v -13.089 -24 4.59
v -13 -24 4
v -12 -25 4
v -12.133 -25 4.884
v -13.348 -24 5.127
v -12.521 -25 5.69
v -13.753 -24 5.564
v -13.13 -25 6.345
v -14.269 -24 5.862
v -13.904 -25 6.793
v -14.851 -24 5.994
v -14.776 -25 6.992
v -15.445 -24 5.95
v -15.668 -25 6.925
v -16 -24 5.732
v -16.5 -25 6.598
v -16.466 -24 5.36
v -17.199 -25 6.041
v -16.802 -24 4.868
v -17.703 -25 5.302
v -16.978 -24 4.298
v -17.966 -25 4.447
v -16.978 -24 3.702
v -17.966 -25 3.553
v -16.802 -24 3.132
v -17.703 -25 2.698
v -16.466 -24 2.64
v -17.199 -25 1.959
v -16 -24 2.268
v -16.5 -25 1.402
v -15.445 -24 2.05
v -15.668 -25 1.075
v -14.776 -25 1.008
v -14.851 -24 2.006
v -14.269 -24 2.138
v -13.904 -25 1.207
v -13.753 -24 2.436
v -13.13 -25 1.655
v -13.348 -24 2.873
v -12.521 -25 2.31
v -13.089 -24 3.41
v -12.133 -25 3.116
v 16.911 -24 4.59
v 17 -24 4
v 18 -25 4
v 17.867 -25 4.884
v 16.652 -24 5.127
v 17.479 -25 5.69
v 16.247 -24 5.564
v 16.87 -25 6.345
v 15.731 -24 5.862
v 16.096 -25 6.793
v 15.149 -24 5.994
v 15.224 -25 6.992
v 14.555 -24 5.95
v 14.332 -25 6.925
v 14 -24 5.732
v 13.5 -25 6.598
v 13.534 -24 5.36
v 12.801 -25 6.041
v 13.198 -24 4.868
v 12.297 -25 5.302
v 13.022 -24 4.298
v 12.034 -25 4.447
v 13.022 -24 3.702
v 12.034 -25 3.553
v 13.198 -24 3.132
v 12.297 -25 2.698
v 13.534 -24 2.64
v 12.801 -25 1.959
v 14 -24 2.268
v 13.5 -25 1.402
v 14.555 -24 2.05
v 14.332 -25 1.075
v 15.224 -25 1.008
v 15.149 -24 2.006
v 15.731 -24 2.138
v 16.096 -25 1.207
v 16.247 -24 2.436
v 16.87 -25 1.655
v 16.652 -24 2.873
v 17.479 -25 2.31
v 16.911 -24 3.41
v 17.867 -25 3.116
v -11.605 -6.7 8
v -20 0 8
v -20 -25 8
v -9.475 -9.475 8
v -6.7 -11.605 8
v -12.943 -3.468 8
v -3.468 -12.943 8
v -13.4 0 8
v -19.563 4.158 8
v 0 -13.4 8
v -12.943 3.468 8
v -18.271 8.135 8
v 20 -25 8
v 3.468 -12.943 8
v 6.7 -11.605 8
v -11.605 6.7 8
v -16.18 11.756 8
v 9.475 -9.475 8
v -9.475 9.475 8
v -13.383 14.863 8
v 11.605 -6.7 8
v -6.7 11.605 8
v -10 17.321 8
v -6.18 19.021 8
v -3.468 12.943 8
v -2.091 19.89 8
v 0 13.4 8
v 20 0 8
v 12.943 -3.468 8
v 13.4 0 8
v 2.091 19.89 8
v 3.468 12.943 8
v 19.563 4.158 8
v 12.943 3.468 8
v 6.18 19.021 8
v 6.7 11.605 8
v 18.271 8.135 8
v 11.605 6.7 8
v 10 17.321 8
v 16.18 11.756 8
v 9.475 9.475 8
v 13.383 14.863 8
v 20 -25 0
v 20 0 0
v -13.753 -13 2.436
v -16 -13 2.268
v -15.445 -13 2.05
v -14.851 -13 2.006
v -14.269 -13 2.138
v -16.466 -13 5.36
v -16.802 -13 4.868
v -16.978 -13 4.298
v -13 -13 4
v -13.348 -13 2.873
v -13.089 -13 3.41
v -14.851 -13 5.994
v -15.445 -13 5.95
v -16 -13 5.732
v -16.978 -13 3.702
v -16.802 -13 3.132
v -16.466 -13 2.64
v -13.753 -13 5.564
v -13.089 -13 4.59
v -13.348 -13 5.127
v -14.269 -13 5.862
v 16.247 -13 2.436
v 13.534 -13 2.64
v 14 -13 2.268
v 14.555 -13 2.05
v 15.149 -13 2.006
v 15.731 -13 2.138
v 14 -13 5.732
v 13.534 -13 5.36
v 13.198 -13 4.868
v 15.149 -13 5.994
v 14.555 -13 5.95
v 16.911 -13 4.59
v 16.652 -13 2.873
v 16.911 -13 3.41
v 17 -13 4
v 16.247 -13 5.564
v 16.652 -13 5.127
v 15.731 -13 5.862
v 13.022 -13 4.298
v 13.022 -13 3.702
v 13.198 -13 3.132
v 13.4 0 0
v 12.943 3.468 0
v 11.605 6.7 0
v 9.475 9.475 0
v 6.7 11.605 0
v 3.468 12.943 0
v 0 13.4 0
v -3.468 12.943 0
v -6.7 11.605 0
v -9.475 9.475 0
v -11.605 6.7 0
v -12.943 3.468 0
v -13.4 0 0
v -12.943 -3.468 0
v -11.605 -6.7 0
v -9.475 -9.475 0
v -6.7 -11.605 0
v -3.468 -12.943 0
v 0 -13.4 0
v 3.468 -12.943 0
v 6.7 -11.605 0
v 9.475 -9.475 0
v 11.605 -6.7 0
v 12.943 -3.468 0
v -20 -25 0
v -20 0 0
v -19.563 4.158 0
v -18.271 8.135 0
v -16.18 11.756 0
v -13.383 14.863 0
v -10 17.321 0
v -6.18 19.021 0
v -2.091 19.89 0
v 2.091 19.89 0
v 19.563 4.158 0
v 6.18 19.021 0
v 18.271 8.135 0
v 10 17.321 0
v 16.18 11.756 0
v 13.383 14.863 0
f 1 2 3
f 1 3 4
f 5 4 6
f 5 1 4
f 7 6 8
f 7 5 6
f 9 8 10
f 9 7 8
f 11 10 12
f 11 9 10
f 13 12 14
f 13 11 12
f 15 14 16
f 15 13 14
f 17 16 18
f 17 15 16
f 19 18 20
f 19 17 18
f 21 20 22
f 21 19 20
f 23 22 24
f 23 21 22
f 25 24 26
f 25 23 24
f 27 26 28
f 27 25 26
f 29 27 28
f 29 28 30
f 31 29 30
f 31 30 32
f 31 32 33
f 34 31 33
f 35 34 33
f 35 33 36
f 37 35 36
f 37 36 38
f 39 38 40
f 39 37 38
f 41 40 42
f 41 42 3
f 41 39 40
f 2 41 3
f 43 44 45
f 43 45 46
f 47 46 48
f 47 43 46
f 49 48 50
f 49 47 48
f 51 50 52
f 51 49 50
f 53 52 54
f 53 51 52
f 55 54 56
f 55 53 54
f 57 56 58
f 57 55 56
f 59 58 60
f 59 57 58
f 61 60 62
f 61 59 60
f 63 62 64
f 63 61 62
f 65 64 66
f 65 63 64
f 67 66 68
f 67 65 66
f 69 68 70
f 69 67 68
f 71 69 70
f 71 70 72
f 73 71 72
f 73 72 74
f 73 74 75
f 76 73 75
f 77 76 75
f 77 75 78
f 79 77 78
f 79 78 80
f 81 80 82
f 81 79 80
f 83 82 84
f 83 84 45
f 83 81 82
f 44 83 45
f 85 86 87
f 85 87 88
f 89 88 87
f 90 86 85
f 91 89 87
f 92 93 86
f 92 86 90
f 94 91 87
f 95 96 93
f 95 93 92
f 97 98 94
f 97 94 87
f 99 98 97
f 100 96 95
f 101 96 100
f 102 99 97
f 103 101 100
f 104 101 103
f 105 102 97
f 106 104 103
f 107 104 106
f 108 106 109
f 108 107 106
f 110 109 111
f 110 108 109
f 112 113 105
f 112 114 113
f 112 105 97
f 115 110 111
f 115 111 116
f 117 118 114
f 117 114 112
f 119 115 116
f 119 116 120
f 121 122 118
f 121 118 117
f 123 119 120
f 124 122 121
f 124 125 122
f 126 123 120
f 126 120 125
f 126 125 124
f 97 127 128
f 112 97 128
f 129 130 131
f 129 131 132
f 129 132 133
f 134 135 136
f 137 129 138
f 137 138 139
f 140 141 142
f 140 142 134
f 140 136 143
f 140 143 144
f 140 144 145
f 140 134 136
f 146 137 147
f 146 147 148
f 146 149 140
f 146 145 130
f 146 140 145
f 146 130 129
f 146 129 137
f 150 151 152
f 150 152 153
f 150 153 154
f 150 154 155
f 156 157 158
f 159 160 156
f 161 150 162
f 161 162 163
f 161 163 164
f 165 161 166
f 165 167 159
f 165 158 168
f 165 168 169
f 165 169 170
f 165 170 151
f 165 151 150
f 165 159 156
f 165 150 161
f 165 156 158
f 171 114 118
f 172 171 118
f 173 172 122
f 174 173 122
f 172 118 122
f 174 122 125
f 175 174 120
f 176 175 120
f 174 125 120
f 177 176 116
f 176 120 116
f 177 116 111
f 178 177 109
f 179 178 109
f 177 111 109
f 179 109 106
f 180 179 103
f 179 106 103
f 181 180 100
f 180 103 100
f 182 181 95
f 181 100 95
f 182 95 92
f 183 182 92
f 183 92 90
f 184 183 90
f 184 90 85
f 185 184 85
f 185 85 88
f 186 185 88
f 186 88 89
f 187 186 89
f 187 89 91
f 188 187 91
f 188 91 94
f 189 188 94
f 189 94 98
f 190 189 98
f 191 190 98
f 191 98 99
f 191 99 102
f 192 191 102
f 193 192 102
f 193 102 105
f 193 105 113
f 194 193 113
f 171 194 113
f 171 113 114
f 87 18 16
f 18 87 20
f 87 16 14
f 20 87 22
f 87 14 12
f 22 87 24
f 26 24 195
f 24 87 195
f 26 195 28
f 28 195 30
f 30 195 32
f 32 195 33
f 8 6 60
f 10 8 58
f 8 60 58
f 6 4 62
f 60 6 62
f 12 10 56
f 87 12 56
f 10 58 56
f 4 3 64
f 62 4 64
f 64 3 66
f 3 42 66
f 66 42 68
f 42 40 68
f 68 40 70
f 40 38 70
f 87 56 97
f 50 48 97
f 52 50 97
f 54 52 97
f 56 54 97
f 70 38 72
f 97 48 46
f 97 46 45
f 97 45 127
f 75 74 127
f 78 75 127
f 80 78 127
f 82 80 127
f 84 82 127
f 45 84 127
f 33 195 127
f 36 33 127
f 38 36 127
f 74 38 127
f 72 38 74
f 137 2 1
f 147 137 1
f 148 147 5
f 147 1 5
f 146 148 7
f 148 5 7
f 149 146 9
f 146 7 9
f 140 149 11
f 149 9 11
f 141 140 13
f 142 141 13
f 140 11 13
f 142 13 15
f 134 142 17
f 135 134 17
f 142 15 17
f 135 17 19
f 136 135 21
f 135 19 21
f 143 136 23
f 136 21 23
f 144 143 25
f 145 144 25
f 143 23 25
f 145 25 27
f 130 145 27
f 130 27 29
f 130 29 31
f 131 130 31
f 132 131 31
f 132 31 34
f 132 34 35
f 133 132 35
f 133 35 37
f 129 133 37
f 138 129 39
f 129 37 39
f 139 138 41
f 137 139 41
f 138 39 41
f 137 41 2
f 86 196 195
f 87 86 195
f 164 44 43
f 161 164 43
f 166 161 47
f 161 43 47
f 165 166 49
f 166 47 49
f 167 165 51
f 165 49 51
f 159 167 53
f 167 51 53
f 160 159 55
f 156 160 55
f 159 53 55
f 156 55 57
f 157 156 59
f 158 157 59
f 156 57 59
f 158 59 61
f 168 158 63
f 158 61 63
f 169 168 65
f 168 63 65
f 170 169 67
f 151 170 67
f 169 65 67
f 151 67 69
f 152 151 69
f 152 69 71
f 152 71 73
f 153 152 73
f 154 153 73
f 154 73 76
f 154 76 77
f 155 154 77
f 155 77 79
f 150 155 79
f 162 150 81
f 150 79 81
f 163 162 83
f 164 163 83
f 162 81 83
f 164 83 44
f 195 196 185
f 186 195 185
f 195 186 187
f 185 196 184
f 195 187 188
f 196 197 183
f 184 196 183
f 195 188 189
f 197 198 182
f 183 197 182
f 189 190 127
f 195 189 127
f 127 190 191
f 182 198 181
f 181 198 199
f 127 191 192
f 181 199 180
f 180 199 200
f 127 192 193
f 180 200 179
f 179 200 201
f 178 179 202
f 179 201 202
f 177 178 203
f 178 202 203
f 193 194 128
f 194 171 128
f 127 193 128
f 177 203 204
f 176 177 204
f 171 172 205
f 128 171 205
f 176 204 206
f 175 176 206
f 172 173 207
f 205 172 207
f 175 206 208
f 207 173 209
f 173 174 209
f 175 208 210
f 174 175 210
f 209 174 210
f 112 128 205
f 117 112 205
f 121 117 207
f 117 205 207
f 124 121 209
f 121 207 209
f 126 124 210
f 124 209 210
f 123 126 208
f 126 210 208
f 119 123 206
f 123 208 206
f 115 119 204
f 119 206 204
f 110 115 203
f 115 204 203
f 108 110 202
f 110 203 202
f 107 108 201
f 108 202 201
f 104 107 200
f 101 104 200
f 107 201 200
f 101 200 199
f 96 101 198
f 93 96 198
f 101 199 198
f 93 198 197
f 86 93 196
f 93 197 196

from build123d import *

# Parameters (mm, degrees)
ESQUISSE1_R             = 7
ESQUISSE1_R_2           = 1.8
BOSS_EXTRU_1_DEPTH      = 8
ESQUISSE2_R             = 13.4
ENL_V_MAT_EXTRU_1_DEPTH = 9
ESQUISSE3_R             = 2
ENL_V_MAT_EXTRU_2_DEPTH = 12
CHANFREIN1_SIZE         = 1


with BuildPart() as part:
    # Esquisse1 → Boss.-Extru.1 (new body)
    with BuildSketch(Plane.XY):
        with BuildLine():
            Line((-20, 0), (-20, -25))
            Line((-20, -25), (20, -25))
            Line((20, -25), (20, 0))
            ThreePointArc((20, 0), (0, 20), (-20, 0))
        make_face()
        Circle(ESQUISSE1_R, mode=Mode.SUBTRACT)
        with Locations((0, 10)):
            Circle(ESQUISSE1_R_2, mode=Mode.SUBTRACT)
        with Locations((10, 0)):
            Circle(ESQUISSE1_R_2, mode=Mode.SUBTRACT)
        with Locations((0, -10)):
            Circle(ESQUISSE1_R_2, mode=Mode.SUBTRACT)
        with Locations((-10, 0)):
            Circle(ESQUISSE1_R_2, mode=Mode.SUBTRACT)
    extrude(amount=BOSS_EXTRU_1_DEPTH)

    # Esquisse2 → Enlèv. mat.-Extru.1 (cut, through all)
    with BuildSketch(Plane.XY.offset(8)):
        Circle(ESQUISSE2_R)
    extrude(amount=-ENL_V_MAT_EXTRU_1_DEPTH, mode=Mode.SUBTRACT)

    # Esquisse3 → Enlèv. mat.-Extru.2 (cut)
    with BuildSketch(Plane.XZ.offset(25)):
        with Locations((-15, 4)):
            Circle(ESQUISSE3_R)
        with Locations((15, 4)):
            Circle(ESQUISSE3_R)
    extrude(amount=-ENL_V_MAT_EXTRU_2_DEPTH, mode=Mode.SUBTRACT)

    # Chanfrein1
    chanfrein1_edges = [part.edges().sort_by_distance(p)[0] for p in [
        (-17, -25, 4),
        (13, -25, 4),
    ]]
    chamfer(chanfrein1_edges, length=CHANFREIN1_SIZE)


solid = part.part
